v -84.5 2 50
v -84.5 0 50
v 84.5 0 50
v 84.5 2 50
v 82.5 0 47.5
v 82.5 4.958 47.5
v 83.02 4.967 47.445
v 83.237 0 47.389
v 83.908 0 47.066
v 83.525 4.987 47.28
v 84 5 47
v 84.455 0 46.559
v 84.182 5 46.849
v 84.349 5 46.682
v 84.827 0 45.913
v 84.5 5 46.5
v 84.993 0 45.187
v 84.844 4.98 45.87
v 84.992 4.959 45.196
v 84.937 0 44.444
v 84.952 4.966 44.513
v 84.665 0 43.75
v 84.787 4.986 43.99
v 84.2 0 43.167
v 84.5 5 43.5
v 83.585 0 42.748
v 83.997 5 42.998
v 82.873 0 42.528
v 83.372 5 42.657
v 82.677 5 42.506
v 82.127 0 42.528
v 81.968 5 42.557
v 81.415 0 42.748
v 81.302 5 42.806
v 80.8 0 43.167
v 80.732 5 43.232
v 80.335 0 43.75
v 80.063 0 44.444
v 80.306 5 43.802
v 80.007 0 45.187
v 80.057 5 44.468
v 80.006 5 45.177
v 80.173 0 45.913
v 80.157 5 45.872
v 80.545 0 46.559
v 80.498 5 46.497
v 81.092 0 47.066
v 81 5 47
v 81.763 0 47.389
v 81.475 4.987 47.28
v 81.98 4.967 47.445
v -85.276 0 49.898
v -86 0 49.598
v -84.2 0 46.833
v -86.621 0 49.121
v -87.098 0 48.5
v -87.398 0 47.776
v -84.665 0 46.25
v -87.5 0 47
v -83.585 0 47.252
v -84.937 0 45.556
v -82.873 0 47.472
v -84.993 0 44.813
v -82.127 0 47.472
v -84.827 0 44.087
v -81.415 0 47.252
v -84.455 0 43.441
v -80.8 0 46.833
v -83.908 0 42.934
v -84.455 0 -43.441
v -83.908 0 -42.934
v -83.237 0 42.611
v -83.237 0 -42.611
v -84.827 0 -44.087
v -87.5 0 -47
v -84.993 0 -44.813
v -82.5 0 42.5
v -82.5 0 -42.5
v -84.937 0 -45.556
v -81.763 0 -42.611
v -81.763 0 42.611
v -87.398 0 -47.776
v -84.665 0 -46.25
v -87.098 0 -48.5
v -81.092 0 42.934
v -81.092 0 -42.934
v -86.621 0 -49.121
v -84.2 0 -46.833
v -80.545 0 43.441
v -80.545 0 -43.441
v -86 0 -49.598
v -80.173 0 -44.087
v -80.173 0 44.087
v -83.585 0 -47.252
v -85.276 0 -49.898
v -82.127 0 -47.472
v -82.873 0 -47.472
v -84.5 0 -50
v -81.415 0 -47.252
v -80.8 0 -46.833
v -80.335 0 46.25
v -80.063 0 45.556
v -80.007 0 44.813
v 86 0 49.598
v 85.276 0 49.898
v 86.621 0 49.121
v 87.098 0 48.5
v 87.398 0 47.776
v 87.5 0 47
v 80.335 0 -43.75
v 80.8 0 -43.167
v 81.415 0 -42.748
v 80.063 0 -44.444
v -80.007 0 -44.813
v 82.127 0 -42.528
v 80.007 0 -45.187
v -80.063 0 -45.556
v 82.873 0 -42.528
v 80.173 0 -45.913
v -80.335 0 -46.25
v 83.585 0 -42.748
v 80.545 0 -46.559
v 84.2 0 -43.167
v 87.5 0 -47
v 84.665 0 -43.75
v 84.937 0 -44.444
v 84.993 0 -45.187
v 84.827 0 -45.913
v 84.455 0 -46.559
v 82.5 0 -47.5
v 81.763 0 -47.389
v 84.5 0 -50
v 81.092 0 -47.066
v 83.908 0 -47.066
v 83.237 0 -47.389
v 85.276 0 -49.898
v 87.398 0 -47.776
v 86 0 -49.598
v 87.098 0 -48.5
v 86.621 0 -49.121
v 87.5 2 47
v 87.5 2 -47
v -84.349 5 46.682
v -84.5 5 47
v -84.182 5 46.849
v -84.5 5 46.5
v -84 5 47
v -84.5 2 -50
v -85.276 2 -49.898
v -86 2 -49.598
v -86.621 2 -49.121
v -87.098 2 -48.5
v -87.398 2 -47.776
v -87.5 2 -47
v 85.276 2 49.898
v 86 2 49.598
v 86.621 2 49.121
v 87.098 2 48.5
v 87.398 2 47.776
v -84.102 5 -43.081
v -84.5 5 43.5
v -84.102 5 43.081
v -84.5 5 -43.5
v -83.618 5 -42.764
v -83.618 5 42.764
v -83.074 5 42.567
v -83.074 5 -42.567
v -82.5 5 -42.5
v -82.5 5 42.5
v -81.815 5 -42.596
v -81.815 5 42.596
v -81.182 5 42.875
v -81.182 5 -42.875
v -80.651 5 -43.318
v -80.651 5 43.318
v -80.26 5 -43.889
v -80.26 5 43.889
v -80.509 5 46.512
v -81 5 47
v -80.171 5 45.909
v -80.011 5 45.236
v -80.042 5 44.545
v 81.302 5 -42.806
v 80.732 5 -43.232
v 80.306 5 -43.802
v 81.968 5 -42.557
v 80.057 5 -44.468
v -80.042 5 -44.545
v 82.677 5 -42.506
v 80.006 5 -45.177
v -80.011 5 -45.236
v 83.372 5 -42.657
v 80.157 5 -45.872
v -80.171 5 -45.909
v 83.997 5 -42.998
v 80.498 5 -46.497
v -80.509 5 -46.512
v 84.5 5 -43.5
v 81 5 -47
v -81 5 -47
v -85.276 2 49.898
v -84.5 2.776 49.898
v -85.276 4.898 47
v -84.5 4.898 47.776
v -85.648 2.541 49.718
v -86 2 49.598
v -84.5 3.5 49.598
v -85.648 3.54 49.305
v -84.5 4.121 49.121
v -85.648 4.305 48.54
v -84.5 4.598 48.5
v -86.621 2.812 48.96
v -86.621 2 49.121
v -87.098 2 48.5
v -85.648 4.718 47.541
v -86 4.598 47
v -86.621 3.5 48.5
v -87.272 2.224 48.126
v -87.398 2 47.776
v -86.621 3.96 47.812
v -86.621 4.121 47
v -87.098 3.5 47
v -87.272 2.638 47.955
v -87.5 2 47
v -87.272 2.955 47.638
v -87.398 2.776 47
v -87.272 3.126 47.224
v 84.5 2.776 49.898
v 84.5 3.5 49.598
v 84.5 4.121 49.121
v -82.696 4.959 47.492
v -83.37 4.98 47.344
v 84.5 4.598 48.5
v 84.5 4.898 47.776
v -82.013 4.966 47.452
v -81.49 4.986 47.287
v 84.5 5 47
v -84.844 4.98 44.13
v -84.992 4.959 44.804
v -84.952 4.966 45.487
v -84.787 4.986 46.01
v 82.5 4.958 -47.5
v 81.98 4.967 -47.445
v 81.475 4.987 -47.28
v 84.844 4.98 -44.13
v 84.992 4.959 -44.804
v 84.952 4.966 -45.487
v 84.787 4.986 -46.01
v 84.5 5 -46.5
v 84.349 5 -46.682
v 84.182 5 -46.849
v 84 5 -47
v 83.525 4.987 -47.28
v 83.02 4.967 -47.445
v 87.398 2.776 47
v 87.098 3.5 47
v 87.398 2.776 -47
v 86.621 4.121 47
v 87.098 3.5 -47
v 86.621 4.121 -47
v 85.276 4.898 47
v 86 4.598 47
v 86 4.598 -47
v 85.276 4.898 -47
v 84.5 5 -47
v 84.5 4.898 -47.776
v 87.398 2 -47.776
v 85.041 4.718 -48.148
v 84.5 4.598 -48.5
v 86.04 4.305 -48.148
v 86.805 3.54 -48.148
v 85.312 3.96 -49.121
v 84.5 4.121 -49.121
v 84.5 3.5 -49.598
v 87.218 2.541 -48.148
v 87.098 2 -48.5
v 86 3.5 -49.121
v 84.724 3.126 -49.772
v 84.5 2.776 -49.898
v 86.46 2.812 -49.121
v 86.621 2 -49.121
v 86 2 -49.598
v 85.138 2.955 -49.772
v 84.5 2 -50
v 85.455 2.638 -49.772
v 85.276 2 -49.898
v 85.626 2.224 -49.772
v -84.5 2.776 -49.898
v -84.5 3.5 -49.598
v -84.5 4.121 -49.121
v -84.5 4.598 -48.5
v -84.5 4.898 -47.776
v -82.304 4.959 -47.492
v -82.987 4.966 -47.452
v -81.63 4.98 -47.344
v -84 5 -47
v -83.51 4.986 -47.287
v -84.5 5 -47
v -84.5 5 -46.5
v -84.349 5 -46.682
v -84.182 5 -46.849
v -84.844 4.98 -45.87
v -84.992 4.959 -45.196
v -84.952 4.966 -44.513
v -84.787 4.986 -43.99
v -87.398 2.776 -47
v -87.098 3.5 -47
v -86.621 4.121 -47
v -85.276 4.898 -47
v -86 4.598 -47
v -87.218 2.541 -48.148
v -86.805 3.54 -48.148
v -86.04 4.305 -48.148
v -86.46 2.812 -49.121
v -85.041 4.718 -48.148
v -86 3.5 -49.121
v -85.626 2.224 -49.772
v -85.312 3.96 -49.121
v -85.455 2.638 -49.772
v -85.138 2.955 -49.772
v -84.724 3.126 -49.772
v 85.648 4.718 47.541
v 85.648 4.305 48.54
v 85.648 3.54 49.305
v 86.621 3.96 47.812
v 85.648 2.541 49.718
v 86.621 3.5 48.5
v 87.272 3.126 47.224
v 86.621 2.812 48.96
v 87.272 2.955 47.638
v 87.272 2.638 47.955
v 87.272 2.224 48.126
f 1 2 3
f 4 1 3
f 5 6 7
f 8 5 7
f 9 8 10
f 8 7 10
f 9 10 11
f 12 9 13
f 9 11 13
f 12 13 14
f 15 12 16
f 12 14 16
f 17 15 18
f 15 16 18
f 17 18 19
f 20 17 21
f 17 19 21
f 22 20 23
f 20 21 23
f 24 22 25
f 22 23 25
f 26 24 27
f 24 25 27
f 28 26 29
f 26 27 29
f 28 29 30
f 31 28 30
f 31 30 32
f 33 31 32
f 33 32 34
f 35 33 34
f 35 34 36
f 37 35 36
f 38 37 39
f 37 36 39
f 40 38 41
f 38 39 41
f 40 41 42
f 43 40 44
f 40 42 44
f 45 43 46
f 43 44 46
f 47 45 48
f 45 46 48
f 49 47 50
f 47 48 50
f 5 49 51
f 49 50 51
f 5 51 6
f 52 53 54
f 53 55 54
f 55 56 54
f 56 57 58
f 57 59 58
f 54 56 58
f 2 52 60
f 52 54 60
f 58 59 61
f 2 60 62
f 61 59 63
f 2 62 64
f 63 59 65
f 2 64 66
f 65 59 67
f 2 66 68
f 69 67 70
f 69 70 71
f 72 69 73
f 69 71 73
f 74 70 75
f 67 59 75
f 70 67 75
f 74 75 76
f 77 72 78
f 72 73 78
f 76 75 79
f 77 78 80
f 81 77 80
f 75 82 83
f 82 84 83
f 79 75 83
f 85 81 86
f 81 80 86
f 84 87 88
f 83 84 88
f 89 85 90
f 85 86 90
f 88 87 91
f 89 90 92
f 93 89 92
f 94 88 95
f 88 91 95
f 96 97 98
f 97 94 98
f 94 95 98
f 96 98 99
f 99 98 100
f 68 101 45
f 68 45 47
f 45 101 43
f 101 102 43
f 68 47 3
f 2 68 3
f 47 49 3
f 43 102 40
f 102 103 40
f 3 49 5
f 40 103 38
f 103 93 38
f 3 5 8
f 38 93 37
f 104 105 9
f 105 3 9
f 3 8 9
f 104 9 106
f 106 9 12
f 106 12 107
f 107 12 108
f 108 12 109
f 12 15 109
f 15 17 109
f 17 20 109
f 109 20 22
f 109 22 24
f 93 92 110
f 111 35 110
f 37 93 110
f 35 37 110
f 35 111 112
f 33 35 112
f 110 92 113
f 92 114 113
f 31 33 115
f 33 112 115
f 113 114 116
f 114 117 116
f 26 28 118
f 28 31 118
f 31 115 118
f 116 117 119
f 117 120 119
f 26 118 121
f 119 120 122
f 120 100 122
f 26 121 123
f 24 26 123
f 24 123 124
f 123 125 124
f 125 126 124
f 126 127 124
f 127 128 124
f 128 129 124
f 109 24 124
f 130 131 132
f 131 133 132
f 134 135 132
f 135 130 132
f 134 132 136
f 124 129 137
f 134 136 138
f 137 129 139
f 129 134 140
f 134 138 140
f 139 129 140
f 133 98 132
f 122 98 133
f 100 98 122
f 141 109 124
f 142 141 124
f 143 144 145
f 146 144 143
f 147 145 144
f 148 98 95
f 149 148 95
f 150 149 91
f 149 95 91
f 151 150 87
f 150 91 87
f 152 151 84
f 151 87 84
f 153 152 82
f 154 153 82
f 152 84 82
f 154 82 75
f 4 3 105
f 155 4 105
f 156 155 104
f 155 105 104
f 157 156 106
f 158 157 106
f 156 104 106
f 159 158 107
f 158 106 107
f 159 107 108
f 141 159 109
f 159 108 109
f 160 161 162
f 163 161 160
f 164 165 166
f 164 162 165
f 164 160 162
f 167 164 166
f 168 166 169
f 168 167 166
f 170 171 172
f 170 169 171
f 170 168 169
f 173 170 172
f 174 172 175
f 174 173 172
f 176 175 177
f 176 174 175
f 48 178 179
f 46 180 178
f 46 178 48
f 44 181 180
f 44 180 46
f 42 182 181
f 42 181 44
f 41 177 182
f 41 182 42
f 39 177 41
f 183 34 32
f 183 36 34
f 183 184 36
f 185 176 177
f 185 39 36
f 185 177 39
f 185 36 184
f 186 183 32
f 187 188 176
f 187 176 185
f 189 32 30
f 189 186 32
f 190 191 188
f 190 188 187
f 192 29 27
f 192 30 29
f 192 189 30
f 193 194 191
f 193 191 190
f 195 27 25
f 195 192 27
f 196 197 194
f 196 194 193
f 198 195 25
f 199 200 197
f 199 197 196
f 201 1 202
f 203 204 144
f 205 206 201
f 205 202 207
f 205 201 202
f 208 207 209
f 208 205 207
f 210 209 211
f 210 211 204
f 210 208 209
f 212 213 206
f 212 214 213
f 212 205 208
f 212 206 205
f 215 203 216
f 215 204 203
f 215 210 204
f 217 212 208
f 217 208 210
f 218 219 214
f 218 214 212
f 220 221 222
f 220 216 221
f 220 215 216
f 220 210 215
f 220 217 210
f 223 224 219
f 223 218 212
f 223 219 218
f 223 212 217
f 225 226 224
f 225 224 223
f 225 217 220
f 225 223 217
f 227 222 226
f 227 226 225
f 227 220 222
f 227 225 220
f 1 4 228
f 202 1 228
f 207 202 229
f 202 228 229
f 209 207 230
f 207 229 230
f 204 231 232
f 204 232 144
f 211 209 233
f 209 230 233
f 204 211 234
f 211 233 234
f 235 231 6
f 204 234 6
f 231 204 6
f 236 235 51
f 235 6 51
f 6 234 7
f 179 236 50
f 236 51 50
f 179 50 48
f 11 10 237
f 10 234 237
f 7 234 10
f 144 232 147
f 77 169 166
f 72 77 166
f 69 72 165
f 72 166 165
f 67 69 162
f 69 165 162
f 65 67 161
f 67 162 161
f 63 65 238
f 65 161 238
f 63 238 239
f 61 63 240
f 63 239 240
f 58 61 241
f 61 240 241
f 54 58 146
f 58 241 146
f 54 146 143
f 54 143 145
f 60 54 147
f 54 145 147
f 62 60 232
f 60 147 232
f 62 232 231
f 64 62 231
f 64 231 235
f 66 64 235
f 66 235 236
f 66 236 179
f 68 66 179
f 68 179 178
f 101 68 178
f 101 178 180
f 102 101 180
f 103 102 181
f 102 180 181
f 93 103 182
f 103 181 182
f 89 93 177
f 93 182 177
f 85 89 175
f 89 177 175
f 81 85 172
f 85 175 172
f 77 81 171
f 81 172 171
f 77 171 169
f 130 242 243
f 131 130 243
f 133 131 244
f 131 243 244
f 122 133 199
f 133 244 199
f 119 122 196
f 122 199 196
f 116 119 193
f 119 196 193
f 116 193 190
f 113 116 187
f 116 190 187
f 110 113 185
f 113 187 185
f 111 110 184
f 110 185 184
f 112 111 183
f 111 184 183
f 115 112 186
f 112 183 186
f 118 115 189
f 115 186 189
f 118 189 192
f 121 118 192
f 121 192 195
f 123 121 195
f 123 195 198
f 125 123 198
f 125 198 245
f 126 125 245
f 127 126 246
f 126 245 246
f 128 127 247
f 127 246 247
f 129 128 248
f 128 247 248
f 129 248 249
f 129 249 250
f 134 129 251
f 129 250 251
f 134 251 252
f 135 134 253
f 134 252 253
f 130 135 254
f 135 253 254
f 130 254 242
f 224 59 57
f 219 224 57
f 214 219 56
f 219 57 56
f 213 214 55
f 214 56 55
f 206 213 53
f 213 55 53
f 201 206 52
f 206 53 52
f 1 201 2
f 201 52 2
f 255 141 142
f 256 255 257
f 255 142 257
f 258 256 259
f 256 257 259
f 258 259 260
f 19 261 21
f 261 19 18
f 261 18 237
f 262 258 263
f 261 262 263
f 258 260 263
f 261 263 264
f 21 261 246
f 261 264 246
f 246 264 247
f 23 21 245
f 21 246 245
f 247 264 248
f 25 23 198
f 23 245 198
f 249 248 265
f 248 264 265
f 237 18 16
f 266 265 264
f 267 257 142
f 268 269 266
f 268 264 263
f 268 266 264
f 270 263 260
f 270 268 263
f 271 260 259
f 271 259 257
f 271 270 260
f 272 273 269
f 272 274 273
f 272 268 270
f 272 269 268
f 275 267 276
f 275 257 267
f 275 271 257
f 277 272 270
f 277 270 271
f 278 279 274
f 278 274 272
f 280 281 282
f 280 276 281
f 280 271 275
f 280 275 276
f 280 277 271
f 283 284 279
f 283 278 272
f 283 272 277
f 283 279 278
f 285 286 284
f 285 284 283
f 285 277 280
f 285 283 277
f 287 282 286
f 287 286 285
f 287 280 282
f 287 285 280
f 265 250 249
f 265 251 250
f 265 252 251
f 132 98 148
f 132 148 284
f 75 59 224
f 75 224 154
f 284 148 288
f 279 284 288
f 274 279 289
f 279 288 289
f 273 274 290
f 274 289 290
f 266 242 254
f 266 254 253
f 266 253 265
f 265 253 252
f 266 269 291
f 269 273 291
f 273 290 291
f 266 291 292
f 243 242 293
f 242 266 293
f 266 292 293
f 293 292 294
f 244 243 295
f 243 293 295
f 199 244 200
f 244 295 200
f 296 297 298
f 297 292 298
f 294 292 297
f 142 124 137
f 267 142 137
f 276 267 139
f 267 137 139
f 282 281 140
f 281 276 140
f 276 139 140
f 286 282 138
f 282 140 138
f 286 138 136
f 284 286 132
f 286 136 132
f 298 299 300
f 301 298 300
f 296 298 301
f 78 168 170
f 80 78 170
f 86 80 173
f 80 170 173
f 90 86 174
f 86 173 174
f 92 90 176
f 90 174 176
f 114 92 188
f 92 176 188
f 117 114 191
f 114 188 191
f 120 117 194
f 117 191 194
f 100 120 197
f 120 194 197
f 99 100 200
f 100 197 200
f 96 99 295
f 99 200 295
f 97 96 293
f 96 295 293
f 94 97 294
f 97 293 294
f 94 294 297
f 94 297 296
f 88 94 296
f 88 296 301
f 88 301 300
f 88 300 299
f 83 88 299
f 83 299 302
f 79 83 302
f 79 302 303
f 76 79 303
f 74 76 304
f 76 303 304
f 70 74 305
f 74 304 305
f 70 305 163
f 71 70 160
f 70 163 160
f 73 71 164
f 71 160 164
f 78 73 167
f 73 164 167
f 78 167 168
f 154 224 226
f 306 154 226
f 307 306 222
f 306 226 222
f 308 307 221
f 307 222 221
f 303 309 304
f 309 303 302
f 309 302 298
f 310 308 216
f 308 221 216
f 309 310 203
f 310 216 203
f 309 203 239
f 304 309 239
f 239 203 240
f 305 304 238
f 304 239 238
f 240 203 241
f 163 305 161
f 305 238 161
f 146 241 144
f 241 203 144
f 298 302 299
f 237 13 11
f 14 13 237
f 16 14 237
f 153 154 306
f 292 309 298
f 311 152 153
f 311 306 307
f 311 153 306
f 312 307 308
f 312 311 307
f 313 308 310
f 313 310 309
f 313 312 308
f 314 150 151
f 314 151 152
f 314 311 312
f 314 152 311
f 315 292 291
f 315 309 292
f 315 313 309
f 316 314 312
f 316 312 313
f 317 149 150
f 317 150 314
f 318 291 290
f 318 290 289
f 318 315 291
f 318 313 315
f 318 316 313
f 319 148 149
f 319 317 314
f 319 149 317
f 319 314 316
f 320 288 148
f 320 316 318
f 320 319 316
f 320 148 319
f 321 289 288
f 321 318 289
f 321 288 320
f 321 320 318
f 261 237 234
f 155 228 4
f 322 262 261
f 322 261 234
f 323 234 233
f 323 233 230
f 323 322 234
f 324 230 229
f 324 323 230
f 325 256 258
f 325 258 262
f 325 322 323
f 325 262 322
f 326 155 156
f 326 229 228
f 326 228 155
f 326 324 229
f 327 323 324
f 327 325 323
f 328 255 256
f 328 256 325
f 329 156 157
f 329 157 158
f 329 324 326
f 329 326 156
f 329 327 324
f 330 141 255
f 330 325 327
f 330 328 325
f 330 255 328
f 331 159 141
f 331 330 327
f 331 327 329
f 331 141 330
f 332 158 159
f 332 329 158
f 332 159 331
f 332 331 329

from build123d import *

# Parameters (mm, degrees)
SKETCH1_W           = 175
SKETCH1_H           = 100
BOSS_EXTRUDE1_DEPTH = 5
SKETCH2_R           = 2.5
CUT_EXTRUDE1_DEPTH  = 101.902180353
FILLET1_R           = 3


with BuildPart() as part:
    # Sketch1 → Boss-Extrude1 (new body)
    with BuildSketch(Plane(origin=(0, 0, 0), x_dir=(1, 0, 0), z_dir=(0, 1, 0))):
        Rectangle(SKETCH1_W, SKETCH1_H)
    extrude(amount=BOSS_EXTRUDE1_DEPTH)

    # Sketch2 → Cut-Extrude1 (cut, through all)
    with BuildSketch(Plane(origin=(0, 5, 0), x_dir=(1, 0, 0), z_dir=(0, 1, 0))):
        with Locations(Location((-82.5, 45, 0), (0, 0, 270))):
            Circle(SKETCH2_R)
        with Locations(Location((82.5, 45, 0), (0, 0, 90))):
            Circle(SKETCH2_R)
        with Locations(Location((82.5, -45, 0), (0, 0, 270))):
            Circle(SKETCH2_R)
        with Locations(Location((-82.5, -45, 0), (0, 0, 90))):
            Circle(SKETCH2_R)
    extrude(amount=-CUT_EXTRUDE1_DEPTH, mode=Mode.SUBTRACT)

    # Fillet1
    # the kernel refuses this fillet: 3 mm, written as the material it takes off along each edge
    with BuildSketch(Plane(origin=(-84.5, 2, 47), x_dir=(0, 1, 0), z_dir=(-1, 0, 0))) as fillet1_piece_1_section:
        Polygon((0, 0), (FILLET1_R, 0), (FILLET1_R, -FILLET1_R), (0, -FILLET1_R), align=None)
    fillet1_piece_1 = extrude(amount=FILLET1_R, mode=Mode.PRIVATE)
    fillet1_piece_1 = fillet1_piece_1 - Plane(origin=(-84.5, 2, 47), x_dir=(0, -0.7071067811865475, -0.7071067811865475), z_dir=(-1, 0, 0)) * Sphere(FILLET1_R, mode=Mode.PRIVATE)
    add(fillet1_piece_1, mode=Mode.SUBTRACT)
    with BuildSketch(Plane(origin=(-84.5, 2, -47), x_dir=(-1, 0, 0), z_dir=(0, 0, -1))) as fillet1_piece_2_section:
        Polygon((0, 0), (FILLET1_R, 0), (FILLET1_R, FILLET1_R), (0, FILLET1_R), align=None)
    fillet1_piece_2 = extrude(amount=FILLET1_R, mode=Mode.PRIVATE)
    fillet1_piece_2 = fillet1_piece_2 - Plane(origin=(-84.5, 2, -47), x_dir=(0.7071067811865475, -0.7071067811865475, 0), z_dir=(0, 0, -1)) * Sphere(FILLET1_R, mode=Mode.PRIVATE)
    add(fillet1_piece_2, mode=Mode.SUBTRACT)
    with BuildSketch(Plane(origin=(84.5, 2, 47), x_dir=(0, 1, 0), z_dir=(1, 0, 0))) as fillet1_piece_3_section:
        Polygon((0, 0), (FILLET1_R, 0), (FILLET1_R, FILLET1_R), (0, FILLET1_R), align=None)
    fillet1_piece_3 = extrude(amount=FILLET1_R, mode=Mode.PRIVATE)
    fillet1_piece_3 = fillet1_piece_3 - Plane(origin=(84.5, 2, 47), x_dir=(0, -0.7071067811865475, -0.7071067811865475), z_dir=(1, 0, 0)) * Sphere(FILLET1_R, mode=Mode.PRIVATE)
    add(fillet1_piece_3, mode=Mode.SUBTRACT)
    with BuildSketch(Plane(origin=(84.5, 2, -47), x_dir=(1, 0, 0), z_dir=(0, 0, -1))) as fillet1_piece_4_section:
        Polygon((0, 0), (FILLET1_R, 0), (FILLET1_R, -FILLET1_R), (0, -FILLET1_R), align=None)
    fillet1_piece_4 = extrude(amount=FILLET1_R, mode=Mode.PRIVATE)
    fillet1_piece_4 = fillet1_piece_4 - Plane(origin=(84.5, 2, -47), x_dir=(-0.7071067811865475, -0.7071067811865475, 0), z_dir=(0, 0, -1)) * Sphere(FILLET1_R, mode=Mode.PRIVATE)
    add(fillet1_piece_4, mode=Mode.SUBTRACT)
    with BuildSketch(Plane(origin=(-87.5, 5, 47), x_dir=(0, -1, 0), z_dir=(0, 0, -1)), Plane(origin=(87.5, 5, -47), x_dir=(0, -1, 0), z_dir=(0, 0, 1))) as fillet1_piece_5:
        with BuildLine():
            CenterArc((FILLET1_R, -FILLET1_R), FILLET1_R, 90, 90)
            Line((0, -FILLET1_R), (0, 0))
            Line((0, 0), (FILLET1_R, 0))
        make_face()
    extrude(amount=94, mode=Mode.SUBTRACT)
    with BuildSketch(Plane(origin=(84.5, 5, 50), x_dir=(0, 0, -1), z_dir=(-1, 0, 0))) as fillet1_piece_6:
        with BuildLine():
            CenterArc((FILLET1_R, FILLET1_R), FILLET1_R, 180, 90)
            Line((0, FILLET1_R), (0, 0))
            Line((0, 0), (FILLET1_R, 0))
        make_face()
    extrude(amount=169, mode=Mode.SUBTRACT)
    with BuildSketch(Plane(origin=(87.5, -7.5, 50), x_dir=(0, 0, -1), z_dir=(0, 1, 0)), Plane(origin=(87.5, -7.5, -50), x_dir=(-1, 0, 0), z_dir=(0, 1, 0))) as fillet1_piece_7:
        with BuildLine():
            CenterArc((FILLET1_R, FILLET1_R), FILLET1_R, 180, 90)
            Line((0, FILLET1_R), (0, 0))
            Line((0, 0), (FILLET1_R, 0))
        make_face()
    extrude(amount=9.5, mode=Mode.SUBTRACT)
    with BuildSketch(Plane(origin=(-87.5, -7.5, 50), x_dir=(0, 0, -1), z_dir=(0, 1, 0)), Plane(origin=(-87.5, -7.5, -50), x_dir=(1, 0, 0), z_dir=(0, 1, 0))) as fillet1_piece_8:
        with BuildLine():
            CenterArc((FILLET1_R, -FILLET1_R), FILLET1_R, 90, 90)
            Line((0, -FILLET1_R), (0, 0))
            Line((0, 0), (FILLET1_R, 0))
        make_face()
    extrude(amount=9.5, mode=Mode.SUBTRACT)
    with BuildSketch(Plane(origin=(-84.5, 5, -50), x_dir=(0, -1, 0), z_dir=(1, 0, 0))) as fillet1_piece_9:
        with BuildLine():
            CenterArc((FILLET1_R, -FILLET1_R), FILLET1_R, 90, 90)
            Line((0, -FILLET1_R), (0, 0))
            Line((0, 0), (FILLET1_R, 0))
        make_face()
    extrude(amount=169, mode=Mode.SUBTRACT)


solid = part.part
